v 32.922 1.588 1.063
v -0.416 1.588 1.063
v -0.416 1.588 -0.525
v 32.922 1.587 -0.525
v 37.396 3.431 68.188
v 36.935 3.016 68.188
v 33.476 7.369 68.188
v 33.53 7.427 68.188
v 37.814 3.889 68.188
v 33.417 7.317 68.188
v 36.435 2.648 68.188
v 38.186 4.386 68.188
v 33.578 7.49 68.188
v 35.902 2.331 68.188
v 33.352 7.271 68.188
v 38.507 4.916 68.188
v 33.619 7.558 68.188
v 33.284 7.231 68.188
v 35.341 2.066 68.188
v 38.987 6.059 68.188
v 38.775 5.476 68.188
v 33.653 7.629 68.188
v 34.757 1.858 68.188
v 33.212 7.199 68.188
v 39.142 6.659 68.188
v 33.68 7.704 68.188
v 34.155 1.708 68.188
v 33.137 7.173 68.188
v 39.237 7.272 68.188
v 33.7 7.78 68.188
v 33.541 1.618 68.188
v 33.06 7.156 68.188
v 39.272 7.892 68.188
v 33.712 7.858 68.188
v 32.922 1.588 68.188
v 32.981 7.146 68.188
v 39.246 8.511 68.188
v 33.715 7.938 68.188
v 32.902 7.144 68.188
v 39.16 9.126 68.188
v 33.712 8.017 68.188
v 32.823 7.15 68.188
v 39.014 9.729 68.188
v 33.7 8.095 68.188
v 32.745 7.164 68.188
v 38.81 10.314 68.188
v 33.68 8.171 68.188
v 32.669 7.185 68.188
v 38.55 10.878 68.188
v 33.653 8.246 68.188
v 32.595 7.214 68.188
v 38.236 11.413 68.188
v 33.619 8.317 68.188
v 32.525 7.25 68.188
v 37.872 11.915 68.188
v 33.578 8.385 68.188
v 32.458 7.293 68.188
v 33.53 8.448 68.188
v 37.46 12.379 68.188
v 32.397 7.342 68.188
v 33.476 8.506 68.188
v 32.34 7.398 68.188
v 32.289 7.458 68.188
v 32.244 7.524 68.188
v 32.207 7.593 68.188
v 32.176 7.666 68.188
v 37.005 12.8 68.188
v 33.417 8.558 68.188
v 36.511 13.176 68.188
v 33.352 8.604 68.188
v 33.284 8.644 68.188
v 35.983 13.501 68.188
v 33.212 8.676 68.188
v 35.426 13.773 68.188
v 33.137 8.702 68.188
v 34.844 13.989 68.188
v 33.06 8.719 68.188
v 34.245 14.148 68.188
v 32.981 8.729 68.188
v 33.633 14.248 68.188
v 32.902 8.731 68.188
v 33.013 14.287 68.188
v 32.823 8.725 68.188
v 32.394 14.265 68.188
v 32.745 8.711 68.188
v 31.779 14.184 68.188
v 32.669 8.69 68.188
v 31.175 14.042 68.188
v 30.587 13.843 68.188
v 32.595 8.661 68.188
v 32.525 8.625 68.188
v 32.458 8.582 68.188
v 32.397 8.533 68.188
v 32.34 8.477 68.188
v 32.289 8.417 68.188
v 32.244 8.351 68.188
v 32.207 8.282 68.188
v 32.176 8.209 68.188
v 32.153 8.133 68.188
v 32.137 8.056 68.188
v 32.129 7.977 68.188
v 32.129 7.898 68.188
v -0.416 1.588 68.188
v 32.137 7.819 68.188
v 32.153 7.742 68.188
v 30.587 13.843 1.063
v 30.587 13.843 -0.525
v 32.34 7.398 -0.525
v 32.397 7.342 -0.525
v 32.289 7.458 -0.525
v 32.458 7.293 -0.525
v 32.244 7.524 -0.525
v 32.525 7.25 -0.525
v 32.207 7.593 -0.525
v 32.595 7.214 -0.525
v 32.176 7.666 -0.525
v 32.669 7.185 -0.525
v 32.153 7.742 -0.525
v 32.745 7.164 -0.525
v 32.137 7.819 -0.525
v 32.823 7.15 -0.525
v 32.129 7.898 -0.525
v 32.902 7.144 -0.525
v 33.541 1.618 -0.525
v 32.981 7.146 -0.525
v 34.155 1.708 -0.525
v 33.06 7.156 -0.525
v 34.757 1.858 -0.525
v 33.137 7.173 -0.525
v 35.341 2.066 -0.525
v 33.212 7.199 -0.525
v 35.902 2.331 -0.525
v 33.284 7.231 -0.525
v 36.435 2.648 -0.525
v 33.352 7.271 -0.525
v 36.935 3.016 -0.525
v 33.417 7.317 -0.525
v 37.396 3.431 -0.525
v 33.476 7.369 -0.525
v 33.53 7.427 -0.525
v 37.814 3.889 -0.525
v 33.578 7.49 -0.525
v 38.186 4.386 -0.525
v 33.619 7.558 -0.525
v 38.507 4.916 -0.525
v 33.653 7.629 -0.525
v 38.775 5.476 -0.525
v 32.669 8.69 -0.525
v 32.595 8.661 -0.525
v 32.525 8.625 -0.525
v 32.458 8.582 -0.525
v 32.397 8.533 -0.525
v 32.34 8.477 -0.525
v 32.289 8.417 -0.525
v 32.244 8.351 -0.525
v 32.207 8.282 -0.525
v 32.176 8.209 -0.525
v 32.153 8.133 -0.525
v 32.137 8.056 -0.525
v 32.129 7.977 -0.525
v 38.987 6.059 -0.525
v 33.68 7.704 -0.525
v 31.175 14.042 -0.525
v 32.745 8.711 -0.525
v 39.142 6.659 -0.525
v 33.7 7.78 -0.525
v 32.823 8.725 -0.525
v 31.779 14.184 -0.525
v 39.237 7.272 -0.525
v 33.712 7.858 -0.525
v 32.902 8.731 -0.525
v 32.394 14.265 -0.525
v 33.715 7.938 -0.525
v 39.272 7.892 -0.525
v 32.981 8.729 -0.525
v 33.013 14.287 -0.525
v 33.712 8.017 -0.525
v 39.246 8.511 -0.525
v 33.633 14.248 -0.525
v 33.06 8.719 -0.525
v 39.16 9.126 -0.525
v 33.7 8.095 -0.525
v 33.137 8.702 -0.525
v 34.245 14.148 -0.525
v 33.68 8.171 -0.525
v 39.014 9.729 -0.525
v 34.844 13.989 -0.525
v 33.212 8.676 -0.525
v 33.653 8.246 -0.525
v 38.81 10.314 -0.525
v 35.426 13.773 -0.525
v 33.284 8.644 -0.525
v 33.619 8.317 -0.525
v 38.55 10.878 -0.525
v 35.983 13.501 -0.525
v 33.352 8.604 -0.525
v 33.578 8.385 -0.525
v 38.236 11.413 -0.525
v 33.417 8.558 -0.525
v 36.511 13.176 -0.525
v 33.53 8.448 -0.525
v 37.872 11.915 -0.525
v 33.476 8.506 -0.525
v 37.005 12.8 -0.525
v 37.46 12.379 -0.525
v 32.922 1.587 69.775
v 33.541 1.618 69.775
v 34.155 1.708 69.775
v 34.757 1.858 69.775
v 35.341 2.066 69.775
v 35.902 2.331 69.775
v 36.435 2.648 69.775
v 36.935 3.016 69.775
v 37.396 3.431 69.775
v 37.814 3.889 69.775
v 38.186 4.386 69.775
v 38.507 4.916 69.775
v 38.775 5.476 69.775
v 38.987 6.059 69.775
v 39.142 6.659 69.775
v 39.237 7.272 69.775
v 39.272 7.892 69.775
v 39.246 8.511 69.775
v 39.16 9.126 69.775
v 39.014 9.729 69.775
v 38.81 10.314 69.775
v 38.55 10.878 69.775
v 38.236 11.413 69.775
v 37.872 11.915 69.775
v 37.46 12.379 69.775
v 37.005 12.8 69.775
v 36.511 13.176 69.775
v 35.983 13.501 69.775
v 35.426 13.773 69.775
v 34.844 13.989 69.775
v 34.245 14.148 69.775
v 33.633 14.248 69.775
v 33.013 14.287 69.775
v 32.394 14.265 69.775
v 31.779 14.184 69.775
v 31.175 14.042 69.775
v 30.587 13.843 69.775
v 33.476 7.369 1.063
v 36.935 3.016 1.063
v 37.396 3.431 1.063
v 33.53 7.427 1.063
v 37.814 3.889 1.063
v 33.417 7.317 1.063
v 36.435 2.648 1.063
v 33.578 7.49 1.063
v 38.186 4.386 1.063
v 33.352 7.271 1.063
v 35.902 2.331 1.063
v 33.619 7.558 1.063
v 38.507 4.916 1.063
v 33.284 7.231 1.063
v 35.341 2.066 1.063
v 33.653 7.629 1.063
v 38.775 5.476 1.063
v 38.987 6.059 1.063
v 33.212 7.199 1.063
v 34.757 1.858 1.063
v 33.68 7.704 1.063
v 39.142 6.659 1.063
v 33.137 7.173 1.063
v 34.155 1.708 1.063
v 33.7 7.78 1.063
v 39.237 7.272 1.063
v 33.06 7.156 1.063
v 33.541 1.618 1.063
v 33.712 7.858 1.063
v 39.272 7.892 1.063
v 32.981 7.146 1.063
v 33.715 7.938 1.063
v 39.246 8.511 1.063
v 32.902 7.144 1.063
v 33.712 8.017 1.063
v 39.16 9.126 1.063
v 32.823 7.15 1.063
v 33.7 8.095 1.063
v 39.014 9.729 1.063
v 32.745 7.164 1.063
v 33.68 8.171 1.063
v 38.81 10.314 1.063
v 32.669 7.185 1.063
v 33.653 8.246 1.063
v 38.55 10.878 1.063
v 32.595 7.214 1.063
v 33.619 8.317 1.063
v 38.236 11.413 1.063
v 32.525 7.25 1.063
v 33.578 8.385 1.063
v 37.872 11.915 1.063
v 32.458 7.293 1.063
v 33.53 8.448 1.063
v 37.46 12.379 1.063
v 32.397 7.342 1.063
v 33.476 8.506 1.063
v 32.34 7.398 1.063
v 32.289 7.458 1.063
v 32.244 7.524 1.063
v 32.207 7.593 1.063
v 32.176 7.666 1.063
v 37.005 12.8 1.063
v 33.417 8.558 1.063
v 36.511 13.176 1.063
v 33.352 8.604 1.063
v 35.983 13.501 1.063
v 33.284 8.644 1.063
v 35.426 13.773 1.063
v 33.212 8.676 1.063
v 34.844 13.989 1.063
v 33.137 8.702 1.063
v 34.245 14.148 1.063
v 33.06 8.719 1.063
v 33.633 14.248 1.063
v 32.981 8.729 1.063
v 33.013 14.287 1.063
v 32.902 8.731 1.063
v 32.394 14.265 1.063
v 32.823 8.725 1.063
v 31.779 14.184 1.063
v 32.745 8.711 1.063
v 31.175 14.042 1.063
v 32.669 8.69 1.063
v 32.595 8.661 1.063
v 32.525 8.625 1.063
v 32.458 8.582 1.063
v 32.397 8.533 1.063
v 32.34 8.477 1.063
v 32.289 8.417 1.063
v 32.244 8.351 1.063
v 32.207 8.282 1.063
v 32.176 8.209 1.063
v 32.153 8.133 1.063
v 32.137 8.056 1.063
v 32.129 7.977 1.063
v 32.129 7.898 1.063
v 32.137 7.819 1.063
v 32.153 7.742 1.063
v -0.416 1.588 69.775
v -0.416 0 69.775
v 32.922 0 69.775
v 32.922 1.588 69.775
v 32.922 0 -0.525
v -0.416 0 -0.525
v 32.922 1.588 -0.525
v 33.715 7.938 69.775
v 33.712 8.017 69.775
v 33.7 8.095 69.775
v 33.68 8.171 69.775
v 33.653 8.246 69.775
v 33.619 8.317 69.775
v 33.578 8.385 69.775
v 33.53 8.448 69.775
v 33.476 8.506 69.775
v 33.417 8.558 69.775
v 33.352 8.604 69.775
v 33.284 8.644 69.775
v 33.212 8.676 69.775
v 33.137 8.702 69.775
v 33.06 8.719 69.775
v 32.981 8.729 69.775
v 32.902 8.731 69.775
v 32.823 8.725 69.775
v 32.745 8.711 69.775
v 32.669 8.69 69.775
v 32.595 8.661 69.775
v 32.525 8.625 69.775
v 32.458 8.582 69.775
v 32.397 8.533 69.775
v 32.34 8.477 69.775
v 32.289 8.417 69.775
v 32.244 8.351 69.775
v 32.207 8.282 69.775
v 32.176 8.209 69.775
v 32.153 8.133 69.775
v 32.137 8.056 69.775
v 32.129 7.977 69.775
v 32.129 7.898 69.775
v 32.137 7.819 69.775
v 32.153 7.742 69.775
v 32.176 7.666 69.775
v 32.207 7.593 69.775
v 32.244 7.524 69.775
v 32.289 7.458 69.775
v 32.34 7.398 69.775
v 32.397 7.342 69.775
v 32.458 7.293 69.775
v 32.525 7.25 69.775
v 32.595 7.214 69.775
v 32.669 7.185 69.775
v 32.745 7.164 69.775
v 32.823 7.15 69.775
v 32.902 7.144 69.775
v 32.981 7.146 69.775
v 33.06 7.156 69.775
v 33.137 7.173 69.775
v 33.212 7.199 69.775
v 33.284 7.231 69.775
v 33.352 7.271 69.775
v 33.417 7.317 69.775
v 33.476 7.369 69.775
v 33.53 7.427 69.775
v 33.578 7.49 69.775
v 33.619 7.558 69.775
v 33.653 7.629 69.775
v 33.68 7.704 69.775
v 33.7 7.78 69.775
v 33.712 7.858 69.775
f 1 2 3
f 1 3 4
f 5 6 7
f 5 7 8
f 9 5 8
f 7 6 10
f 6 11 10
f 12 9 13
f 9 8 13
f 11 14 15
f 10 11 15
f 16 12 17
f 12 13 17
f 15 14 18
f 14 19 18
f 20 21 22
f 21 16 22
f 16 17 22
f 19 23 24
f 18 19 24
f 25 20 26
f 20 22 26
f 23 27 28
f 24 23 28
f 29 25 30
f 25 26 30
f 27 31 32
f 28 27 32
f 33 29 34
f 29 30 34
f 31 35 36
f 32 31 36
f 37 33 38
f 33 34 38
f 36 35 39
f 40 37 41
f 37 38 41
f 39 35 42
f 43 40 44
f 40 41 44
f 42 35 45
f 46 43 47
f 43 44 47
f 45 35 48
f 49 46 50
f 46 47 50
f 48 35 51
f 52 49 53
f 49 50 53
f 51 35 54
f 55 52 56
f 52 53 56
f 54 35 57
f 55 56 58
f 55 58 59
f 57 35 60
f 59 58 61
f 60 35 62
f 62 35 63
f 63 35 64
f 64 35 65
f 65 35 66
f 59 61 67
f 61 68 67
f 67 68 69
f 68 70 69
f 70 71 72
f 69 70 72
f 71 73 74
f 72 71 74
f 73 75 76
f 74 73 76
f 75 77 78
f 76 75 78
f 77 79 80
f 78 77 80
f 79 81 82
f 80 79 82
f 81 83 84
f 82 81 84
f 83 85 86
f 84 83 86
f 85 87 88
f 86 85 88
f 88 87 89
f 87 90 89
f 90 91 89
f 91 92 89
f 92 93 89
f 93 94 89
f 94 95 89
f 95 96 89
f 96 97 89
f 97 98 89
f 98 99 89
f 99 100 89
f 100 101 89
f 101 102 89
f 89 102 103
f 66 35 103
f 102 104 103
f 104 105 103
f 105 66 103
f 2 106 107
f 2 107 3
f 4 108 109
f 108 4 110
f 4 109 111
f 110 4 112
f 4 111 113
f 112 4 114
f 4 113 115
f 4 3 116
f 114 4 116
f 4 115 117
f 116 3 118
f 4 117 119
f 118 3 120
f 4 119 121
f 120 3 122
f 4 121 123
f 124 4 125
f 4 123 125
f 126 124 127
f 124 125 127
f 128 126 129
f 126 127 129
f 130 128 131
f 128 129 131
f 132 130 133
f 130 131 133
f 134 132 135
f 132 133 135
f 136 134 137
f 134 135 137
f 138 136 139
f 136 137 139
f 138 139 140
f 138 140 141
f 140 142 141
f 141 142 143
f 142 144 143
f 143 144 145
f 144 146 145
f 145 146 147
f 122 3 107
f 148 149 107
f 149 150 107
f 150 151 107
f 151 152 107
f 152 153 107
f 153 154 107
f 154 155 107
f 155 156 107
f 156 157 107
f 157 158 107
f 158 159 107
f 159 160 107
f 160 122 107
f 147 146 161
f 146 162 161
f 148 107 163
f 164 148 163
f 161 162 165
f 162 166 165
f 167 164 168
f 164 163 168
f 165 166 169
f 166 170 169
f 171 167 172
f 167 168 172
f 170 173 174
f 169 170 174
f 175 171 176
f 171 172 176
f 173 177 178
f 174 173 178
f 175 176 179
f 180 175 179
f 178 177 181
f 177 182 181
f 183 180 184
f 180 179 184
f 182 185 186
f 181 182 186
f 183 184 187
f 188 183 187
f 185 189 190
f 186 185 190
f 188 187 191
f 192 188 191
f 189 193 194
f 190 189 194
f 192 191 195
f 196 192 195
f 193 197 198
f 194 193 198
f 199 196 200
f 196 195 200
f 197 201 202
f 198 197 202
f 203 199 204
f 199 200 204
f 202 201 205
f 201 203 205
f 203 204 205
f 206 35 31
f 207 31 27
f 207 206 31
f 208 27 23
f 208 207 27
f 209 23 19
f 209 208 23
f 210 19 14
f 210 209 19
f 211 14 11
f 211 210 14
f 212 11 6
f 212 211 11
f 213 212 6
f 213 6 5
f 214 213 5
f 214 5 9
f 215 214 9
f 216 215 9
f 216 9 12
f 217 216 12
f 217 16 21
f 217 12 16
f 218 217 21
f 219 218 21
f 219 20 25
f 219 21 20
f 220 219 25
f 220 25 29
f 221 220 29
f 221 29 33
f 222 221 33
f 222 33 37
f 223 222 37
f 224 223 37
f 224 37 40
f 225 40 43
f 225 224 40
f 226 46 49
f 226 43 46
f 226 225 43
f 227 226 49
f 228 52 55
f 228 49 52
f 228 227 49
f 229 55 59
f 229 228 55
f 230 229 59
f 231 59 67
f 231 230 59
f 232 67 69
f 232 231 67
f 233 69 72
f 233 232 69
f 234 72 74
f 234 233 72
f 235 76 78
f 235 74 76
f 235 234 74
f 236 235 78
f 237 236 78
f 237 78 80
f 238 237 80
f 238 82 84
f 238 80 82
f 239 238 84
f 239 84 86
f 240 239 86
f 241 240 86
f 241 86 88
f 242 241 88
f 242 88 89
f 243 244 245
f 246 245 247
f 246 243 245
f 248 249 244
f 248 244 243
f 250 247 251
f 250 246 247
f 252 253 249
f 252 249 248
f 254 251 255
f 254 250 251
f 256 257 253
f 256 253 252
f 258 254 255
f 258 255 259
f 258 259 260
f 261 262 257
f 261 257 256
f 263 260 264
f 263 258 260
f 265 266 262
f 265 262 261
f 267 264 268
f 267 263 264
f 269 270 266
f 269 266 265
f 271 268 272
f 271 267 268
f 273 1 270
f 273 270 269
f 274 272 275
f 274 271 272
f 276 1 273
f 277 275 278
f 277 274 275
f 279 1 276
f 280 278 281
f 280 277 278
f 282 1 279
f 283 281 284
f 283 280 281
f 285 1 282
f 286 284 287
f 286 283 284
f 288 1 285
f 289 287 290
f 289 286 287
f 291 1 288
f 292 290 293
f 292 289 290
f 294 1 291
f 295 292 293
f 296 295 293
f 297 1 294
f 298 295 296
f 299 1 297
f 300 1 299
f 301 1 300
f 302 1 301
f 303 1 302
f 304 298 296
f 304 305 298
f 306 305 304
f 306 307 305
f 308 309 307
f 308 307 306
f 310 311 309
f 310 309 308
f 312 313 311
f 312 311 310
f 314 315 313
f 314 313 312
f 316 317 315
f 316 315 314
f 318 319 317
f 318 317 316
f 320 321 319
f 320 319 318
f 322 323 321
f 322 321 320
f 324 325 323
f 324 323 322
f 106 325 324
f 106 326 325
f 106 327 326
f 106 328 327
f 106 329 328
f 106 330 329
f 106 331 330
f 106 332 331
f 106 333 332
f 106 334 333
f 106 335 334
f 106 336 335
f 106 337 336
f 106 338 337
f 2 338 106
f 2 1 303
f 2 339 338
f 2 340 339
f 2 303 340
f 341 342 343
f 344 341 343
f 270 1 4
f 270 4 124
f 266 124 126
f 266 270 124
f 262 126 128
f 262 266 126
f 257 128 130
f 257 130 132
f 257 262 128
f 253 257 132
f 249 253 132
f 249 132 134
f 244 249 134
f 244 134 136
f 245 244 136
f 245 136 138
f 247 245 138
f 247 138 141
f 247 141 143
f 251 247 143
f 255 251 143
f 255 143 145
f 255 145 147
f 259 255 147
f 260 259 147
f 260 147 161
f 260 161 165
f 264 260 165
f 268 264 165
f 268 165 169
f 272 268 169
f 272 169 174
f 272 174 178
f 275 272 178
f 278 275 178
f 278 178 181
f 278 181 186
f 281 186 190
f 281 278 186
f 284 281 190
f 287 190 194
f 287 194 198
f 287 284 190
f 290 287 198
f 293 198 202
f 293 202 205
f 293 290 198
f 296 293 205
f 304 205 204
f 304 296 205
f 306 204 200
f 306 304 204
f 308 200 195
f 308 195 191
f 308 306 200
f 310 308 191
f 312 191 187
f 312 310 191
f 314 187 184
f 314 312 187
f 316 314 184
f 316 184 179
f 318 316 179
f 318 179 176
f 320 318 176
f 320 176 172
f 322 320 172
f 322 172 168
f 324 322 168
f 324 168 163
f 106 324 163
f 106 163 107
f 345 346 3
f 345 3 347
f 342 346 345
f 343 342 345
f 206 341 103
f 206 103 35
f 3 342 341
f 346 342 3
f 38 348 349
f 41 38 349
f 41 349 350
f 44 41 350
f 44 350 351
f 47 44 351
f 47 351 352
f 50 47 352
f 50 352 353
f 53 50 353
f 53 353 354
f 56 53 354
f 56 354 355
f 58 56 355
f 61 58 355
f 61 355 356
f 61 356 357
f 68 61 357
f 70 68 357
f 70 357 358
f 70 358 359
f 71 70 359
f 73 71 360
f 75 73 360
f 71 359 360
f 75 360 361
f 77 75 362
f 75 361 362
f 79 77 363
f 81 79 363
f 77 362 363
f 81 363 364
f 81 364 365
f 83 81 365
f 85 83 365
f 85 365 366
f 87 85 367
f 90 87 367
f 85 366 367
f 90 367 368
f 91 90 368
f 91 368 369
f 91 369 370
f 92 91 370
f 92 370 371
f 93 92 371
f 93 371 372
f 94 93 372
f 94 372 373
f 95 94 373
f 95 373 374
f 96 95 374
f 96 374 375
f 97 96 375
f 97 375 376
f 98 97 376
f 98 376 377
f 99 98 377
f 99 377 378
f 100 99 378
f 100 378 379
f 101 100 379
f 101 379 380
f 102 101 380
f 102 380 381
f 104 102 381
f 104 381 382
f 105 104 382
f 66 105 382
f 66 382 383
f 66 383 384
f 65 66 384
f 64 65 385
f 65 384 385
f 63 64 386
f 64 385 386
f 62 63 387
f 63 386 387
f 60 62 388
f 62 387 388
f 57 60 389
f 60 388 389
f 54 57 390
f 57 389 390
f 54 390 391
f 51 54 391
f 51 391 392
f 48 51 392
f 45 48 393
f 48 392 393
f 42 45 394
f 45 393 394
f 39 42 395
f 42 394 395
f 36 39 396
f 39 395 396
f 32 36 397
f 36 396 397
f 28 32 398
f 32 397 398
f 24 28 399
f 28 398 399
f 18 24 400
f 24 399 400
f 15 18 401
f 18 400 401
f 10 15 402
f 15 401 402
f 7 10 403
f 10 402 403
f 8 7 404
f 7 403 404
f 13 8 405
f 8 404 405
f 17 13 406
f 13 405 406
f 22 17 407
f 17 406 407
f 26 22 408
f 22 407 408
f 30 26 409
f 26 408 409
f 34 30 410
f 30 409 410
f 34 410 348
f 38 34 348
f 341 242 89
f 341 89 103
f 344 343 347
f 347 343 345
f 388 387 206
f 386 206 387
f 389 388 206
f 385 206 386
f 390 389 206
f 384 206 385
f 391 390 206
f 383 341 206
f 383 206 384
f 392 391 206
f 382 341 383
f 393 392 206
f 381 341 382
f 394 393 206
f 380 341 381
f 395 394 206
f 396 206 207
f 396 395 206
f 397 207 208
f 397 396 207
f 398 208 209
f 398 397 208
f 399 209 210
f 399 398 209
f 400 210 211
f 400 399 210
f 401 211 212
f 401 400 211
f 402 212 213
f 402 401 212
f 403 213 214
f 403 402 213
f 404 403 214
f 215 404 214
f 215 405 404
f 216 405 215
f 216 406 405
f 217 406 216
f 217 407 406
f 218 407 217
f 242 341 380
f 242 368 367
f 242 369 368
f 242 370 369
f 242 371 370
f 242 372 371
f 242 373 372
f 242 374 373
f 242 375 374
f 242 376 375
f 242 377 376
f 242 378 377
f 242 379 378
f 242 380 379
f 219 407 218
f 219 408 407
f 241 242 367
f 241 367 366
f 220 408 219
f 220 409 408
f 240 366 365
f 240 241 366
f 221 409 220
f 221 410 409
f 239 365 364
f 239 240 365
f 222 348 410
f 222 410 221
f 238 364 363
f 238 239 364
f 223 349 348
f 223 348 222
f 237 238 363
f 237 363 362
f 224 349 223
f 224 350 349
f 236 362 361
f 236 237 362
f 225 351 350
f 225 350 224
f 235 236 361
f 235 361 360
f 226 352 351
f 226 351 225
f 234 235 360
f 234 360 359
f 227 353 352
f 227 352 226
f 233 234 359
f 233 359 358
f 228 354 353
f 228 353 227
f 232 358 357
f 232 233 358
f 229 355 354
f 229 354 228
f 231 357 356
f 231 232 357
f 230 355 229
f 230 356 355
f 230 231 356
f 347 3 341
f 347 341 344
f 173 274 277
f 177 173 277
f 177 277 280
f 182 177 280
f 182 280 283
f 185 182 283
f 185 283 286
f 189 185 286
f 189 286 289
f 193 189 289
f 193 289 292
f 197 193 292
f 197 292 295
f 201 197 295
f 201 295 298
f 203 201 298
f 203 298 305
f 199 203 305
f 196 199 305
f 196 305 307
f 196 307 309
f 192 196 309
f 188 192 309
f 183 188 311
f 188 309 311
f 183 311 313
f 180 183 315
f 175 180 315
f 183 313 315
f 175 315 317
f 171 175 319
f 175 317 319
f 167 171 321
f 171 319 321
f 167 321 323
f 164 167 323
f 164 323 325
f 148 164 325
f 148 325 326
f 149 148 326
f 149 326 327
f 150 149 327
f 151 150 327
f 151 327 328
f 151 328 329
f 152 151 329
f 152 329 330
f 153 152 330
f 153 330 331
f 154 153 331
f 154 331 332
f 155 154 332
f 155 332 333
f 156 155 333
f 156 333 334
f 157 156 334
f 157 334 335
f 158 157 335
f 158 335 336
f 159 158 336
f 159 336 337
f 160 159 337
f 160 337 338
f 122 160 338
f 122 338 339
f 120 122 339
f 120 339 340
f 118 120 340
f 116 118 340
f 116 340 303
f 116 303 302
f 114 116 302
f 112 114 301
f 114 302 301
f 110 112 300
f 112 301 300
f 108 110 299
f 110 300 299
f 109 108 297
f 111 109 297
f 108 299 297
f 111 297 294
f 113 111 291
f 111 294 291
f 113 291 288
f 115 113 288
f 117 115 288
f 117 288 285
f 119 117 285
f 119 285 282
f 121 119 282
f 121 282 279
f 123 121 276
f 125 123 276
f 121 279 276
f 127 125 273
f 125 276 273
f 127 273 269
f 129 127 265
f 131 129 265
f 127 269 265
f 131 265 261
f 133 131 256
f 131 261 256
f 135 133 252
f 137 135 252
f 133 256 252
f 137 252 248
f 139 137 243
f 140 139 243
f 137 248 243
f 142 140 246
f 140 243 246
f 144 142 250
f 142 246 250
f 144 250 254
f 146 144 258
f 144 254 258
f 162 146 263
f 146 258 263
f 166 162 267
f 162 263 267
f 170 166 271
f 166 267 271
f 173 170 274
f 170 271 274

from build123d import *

# Parameters (mm, degrees)
SKETCH1_W           = 33.3375
SKETCH1_H           = 70.3
BOSS_EXTRUDE1_DEPTH = 1.5875
SKETCH3_R           = 0.79375
BOSS_EXTRUDE2_DEPTH = 70.3
SKETCH4_W           = 67.125
SKETCH4_H           = 12.7
CUT_EXTRUDE1_DEPTH  = 40.6875


with BuildPart() as part:
    # Sketch1 → Boss-Extrude1 (new body)
    with BuildSketch(Plane(origin=(0, 0, 0), x_dir=(1, 0, 0), z_dir=(0, 1, 0))):
        with Locations((16.252975171, -34.625224743)):
            Rectangle(SKETCH1_W, SKETCH1_H)
    extrude(amount=BOSS_EXTRUDE1_DEPTH)


with BuildPart() as body_2:
    # Sketch3 → Boss-Extrude2 (new body)
    with BuildSketch(Plane.XY.offset(69.775224743)):
        with BuildLine():
            Line((30.587370685, 13.84286105), (-0.415774829, 1.5875))
            Line((-0.415774829, 1.5875), (32.921725171, 1.5875))
            ThreePointArc((32.921725171, 1.5875), (39.159575068, 9.125661885), (30.587370685, 13.84286105))
        make_face()
        with Locations((32.921725171, 7.9375)):
            Circle(SKETCH3_R, mode=Mode.SUBTRACT)
    extrude(amount=-BOSS_EXTRUDE2_DEPTH)

    # Sketch4 → Cut-Extrude1 (cut, through all)
    with BuildSketch(Plane.ZY.offset(0.415774829)):
        with Locations((34.625224743, 7.9375)):
            Rectangle(SKETCH4_W, SKETCH4_H)
    extrude(amount=-CUT_EXTRUDE1_DEPTH, mode=Mode.SUBTRACT)


solid = Compound([part.part, body_2.part])
